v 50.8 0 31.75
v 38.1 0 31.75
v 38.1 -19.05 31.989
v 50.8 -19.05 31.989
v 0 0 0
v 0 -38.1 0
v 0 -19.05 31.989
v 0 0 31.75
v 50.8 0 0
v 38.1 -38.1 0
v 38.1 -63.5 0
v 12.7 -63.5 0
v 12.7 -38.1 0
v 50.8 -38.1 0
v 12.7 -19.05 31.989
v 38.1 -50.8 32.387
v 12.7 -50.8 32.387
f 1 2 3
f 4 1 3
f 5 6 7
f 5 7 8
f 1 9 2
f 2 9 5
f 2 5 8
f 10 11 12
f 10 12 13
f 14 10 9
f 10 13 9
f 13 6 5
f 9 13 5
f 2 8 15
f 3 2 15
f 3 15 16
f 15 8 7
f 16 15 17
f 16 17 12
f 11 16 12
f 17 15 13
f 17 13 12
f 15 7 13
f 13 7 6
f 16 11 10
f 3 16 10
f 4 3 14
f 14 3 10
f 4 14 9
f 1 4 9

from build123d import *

# Parameters (mm, degrees)
F1_DEPTH = 38.1
F3_DEPTH = 12.7
F5_DEPTH = 12.7
F7_DEPTH = 25.4
F9_DEPTH = 50.8


with BuildPart() as f1:
    # F0 (on Right) → F1 (new body)
    with BuildSketch(Plane.YZ):
        Polygon((0, 0), (0, 31.75), (-63.5, 32.545739), (-63.5, 0), align=None)
    extrude(amount=F1_DEPTH)

    # F2 (on face) → F3 (cut)
    with BuildSketch(Plane(origin=(0, 0, 0), x_dir=(0, -1, 0), z_dir=(-1, 0, 0))):
        Polygon((63.5, 32.545739), (19.05, 31.988722), (38.1, 0), (63.5, 0), align=None)
    extrude(amount=-F3_DEPTH, mode=Mode.SUBTRACT)

    # F4 (on face) → F5 (join)
    with BuildSketch(Plane.YZ.offset(38.1)):
        Polygon((0, 31.75), (-19.05, 31.988722), (-38.1, 0), (0, 0), align=None)
    extrude(amount=F5_DEPTH)

    # F6 (on face) → F7 (cut)
    with BuildSketch(Plane(origin=(12.7, 0, 0), x_dir=(0, -1, 0), z_dir=(-1, 0, 0))):
        Polygon((63.5, 32.545739), (50.8, 32.386591), (63.5, 0), align=None)
    extrude(amount=F7_DEPTH, mode=Mode.SUBTRACT)

    # F8 (on face) → F9 (cut)
    with BuildSketch(Plane(origin=(12.7, 0, 0), x_dir=(0, -1, 0), z_dir=(-1, 0, 0))):
        Polygon((63.5, 32.545739), (50.8, 32.386591), (63.5, 0), align=None)
    extrude(amount=-F9_DEPTH, mode=Mode.SUBTRACT)


solid = f1.part
